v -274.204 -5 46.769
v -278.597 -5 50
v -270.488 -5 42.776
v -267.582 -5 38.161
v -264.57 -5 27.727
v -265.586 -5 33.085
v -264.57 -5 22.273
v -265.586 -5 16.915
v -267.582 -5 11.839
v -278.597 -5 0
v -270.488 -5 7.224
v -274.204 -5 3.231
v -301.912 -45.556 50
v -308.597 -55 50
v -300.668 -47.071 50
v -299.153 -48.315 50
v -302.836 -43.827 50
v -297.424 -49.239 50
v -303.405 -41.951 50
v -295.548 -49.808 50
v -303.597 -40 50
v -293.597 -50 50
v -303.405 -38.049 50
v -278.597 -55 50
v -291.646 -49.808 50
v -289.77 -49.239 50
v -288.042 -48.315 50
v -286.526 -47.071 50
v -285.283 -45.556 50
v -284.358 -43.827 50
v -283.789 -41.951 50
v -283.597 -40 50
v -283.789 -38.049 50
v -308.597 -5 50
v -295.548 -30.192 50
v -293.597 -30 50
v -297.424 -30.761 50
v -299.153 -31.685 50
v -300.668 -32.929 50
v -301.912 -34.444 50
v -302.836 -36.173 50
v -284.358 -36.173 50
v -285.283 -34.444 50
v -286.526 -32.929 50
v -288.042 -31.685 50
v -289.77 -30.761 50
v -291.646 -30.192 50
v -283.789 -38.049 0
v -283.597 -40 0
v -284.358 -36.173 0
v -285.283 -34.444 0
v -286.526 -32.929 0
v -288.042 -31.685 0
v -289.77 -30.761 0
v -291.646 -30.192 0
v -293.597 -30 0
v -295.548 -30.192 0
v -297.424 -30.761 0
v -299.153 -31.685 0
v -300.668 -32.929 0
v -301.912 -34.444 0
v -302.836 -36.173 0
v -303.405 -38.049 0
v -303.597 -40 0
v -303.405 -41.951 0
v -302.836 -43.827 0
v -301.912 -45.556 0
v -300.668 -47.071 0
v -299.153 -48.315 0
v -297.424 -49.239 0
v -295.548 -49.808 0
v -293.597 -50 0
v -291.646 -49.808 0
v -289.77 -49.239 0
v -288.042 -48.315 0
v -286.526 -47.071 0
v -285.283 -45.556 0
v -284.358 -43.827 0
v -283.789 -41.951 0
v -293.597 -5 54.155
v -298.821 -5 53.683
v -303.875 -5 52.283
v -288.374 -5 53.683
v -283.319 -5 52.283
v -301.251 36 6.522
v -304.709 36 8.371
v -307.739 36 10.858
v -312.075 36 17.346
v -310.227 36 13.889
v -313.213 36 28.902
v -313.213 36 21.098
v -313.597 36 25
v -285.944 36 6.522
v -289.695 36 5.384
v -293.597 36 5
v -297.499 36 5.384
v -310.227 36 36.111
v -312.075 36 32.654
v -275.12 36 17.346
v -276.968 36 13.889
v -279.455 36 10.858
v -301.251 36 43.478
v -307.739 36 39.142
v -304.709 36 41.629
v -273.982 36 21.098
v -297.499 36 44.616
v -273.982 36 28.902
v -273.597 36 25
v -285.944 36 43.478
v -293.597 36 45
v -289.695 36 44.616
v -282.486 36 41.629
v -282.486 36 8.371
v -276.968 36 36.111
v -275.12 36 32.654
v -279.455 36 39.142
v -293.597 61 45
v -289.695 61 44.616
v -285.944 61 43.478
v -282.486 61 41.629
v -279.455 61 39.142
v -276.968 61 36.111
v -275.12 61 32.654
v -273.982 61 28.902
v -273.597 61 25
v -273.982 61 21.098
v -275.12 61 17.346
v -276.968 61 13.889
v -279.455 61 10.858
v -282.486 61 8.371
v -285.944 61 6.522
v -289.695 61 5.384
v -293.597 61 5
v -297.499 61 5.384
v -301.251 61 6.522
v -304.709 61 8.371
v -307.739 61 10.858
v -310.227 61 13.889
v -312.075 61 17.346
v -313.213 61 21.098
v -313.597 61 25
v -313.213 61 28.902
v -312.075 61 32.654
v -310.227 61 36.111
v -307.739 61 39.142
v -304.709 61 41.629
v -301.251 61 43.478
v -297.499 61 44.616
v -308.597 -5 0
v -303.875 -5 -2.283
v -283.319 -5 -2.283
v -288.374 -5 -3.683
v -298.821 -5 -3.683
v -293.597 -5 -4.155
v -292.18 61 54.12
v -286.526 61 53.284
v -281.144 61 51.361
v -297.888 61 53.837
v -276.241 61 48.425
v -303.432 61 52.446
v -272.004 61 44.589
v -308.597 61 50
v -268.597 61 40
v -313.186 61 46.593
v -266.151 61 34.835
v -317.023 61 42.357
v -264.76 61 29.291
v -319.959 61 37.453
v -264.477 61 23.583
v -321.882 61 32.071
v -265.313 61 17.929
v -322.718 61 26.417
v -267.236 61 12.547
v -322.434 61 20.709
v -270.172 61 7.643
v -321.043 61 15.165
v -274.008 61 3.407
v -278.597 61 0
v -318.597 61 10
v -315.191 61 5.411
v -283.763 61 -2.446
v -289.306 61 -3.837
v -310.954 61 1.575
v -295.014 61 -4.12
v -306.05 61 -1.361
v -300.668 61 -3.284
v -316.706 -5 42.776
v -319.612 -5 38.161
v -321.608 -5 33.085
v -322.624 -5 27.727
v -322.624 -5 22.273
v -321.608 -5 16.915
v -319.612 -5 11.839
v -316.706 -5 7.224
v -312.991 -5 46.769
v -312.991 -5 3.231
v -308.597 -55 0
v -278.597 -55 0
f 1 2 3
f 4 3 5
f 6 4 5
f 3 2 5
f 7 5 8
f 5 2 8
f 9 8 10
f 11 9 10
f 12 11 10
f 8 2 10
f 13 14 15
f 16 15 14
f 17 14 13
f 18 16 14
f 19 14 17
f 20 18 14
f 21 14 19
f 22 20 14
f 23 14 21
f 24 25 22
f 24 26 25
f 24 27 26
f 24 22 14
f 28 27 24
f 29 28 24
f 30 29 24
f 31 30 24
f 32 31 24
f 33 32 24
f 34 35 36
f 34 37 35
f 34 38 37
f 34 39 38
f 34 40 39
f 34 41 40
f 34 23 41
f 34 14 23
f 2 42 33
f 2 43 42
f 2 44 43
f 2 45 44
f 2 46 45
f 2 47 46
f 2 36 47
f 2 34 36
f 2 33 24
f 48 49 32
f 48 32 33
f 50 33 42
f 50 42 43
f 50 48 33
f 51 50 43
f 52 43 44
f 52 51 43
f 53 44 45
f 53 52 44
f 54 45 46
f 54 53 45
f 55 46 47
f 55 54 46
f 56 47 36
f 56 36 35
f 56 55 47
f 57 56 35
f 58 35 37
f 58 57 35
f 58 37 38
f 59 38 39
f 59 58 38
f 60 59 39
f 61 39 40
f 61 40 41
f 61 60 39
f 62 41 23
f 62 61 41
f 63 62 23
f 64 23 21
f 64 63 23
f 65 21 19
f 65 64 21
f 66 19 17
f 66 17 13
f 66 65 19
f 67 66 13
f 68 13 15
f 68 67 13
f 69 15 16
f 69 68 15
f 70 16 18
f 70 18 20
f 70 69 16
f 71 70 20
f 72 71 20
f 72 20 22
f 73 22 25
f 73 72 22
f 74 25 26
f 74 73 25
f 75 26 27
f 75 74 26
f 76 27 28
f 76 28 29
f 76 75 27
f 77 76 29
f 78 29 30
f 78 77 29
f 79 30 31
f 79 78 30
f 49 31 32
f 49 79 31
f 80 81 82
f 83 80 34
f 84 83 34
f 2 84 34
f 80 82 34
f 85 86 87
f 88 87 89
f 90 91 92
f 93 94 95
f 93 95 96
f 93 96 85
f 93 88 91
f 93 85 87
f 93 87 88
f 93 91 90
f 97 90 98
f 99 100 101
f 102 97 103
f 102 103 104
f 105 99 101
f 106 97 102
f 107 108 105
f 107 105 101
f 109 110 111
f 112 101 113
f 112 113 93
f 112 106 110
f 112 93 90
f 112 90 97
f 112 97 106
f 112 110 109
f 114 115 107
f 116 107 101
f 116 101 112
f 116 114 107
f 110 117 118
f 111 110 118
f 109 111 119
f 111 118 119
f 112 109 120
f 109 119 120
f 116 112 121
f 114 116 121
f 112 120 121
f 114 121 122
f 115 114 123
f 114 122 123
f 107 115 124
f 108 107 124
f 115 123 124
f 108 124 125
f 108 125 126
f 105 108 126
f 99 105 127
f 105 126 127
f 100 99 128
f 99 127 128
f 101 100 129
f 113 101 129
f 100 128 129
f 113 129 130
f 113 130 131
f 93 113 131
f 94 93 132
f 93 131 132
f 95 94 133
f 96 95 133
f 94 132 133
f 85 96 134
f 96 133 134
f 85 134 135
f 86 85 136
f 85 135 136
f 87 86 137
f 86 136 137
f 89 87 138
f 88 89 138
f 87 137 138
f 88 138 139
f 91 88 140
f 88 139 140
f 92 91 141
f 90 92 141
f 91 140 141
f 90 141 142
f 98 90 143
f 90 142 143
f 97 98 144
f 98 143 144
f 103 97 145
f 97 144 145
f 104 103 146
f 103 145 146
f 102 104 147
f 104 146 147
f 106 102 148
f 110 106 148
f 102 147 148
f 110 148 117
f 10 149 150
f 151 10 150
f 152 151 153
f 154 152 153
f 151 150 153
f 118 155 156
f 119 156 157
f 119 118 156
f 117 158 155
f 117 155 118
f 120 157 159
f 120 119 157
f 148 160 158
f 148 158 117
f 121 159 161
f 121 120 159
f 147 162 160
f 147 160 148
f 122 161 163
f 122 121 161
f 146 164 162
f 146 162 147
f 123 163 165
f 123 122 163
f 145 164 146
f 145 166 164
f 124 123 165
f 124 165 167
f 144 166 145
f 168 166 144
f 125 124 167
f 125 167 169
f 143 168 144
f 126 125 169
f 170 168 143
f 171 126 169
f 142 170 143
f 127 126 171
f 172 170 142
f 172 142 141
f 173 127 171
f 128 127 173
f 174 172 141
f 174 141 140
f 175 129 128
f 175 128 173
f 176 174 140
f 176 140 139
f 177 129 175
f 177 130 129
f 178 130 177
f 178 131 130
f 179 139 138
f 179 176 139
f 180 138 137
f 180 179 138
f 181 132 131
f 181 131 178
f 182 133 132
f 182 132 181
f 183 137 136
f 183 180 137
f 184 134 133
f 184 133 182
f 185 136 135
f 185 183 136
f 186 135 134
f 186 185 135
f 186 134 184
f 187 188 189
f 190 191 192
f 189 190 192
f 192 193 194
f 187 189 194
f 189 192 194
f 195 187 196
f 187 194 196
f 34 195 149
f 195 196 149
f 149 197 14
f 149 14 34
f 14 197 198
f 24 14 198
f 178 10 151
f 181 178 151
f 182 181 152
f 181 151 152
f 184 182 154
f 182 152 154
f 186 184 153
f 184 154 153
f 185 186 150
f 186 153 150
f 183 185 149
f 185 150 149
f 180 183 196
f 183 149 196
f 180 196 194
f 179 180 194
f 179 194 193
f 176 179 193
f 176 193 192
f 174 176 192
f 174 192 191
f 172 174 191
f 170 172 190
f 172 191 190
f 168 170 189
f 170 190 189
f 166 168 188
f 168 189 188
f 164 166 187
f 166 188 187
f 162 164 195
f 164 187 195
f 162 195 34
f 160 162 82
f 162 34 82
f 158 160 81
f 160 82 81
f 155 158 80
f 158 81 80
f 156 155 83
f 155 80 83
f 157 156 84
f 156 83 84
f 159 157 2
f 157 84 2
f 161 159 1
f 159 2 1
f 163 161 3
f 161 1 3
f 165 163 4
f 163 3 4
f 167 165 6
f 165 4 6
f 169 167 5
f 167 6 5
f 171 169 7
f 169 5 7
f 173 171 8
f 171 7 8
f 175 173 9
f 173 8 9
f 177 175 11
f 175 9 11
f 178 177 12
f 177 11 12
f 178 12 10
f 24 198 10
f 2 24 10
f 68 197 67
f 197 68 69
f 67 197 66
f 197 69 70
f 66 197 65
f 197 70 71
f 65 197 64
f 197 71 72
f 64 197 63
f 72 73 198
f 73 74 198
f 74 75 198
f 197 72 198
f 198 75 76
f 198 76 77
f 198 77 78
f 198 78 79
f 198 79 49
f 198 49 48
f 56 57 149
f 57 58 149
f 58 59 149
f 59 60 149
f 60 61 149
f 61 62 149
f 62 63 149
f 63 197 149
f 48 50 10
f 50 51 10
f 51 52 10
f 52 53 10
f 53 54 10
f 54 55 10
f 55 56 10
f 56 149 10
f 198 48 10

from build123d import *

# Parameters (mm, degrees)
ESQUISSE1_W             = 30
ESQUISSE1_H             = 50
ESQUISSE1_R             = 10
BOSS_EXTRU_1_DEPTH      = 50
ESQUISSE3_R             = 29.154759474
BOSS_EXTRU_2_DEPTH      = 66
ESQUISSE4_R             = 20
ENL_V_MAT_EXTRU_1_DEPTH = 25


with BuildPart() as part:
    # Esquisse1 → Boss.-Extru.1 (new body)
    with BuildSketch(Plane.XY):
        with Locations((-293.597239891, -30)):
            Rectangle(ESQUISSE1_W, ESQUISSE1_H)
        with Locations((-293.597239891, -40)):
            Circle(ESQUISSE1_R, mode=Mode.SUBTRACT)
    extrude(amount=BOSS_EXTRU_1_DEPTH)

    # Esquisse3 → Boss.-Extru.2 (add)
    with BuildSketch(Plane(origin=(0, -5, 0), x_dir=(1, 0, 0), z_dir=(0, 1, 0))):
        with Locations(Location((-293.597239891, -25, 0), (0, 0, 59.036243468))):
            Circle(ESQUISSE3_R)
    extrude(amount=BOSS_EXTRU_2_DEPTH)

    # Esquisse4 → Enlèv. mat.-Extru.1 (cut)
    with BuildSketch(Plane(origin=(0, 61, 0), x_dir=(1, 0, 0), z_dir=(0, 1, 0))):
        with Locations(Location((-293.597239891, -25, 0), (0, 0, 270))):
            Circle(ESQUISSE4_R)
    extrude(amount=-ENL_V_MAT_EXTRU_1_DEPTH, mode=Mode.SUBTRACT)


solid = part.part
